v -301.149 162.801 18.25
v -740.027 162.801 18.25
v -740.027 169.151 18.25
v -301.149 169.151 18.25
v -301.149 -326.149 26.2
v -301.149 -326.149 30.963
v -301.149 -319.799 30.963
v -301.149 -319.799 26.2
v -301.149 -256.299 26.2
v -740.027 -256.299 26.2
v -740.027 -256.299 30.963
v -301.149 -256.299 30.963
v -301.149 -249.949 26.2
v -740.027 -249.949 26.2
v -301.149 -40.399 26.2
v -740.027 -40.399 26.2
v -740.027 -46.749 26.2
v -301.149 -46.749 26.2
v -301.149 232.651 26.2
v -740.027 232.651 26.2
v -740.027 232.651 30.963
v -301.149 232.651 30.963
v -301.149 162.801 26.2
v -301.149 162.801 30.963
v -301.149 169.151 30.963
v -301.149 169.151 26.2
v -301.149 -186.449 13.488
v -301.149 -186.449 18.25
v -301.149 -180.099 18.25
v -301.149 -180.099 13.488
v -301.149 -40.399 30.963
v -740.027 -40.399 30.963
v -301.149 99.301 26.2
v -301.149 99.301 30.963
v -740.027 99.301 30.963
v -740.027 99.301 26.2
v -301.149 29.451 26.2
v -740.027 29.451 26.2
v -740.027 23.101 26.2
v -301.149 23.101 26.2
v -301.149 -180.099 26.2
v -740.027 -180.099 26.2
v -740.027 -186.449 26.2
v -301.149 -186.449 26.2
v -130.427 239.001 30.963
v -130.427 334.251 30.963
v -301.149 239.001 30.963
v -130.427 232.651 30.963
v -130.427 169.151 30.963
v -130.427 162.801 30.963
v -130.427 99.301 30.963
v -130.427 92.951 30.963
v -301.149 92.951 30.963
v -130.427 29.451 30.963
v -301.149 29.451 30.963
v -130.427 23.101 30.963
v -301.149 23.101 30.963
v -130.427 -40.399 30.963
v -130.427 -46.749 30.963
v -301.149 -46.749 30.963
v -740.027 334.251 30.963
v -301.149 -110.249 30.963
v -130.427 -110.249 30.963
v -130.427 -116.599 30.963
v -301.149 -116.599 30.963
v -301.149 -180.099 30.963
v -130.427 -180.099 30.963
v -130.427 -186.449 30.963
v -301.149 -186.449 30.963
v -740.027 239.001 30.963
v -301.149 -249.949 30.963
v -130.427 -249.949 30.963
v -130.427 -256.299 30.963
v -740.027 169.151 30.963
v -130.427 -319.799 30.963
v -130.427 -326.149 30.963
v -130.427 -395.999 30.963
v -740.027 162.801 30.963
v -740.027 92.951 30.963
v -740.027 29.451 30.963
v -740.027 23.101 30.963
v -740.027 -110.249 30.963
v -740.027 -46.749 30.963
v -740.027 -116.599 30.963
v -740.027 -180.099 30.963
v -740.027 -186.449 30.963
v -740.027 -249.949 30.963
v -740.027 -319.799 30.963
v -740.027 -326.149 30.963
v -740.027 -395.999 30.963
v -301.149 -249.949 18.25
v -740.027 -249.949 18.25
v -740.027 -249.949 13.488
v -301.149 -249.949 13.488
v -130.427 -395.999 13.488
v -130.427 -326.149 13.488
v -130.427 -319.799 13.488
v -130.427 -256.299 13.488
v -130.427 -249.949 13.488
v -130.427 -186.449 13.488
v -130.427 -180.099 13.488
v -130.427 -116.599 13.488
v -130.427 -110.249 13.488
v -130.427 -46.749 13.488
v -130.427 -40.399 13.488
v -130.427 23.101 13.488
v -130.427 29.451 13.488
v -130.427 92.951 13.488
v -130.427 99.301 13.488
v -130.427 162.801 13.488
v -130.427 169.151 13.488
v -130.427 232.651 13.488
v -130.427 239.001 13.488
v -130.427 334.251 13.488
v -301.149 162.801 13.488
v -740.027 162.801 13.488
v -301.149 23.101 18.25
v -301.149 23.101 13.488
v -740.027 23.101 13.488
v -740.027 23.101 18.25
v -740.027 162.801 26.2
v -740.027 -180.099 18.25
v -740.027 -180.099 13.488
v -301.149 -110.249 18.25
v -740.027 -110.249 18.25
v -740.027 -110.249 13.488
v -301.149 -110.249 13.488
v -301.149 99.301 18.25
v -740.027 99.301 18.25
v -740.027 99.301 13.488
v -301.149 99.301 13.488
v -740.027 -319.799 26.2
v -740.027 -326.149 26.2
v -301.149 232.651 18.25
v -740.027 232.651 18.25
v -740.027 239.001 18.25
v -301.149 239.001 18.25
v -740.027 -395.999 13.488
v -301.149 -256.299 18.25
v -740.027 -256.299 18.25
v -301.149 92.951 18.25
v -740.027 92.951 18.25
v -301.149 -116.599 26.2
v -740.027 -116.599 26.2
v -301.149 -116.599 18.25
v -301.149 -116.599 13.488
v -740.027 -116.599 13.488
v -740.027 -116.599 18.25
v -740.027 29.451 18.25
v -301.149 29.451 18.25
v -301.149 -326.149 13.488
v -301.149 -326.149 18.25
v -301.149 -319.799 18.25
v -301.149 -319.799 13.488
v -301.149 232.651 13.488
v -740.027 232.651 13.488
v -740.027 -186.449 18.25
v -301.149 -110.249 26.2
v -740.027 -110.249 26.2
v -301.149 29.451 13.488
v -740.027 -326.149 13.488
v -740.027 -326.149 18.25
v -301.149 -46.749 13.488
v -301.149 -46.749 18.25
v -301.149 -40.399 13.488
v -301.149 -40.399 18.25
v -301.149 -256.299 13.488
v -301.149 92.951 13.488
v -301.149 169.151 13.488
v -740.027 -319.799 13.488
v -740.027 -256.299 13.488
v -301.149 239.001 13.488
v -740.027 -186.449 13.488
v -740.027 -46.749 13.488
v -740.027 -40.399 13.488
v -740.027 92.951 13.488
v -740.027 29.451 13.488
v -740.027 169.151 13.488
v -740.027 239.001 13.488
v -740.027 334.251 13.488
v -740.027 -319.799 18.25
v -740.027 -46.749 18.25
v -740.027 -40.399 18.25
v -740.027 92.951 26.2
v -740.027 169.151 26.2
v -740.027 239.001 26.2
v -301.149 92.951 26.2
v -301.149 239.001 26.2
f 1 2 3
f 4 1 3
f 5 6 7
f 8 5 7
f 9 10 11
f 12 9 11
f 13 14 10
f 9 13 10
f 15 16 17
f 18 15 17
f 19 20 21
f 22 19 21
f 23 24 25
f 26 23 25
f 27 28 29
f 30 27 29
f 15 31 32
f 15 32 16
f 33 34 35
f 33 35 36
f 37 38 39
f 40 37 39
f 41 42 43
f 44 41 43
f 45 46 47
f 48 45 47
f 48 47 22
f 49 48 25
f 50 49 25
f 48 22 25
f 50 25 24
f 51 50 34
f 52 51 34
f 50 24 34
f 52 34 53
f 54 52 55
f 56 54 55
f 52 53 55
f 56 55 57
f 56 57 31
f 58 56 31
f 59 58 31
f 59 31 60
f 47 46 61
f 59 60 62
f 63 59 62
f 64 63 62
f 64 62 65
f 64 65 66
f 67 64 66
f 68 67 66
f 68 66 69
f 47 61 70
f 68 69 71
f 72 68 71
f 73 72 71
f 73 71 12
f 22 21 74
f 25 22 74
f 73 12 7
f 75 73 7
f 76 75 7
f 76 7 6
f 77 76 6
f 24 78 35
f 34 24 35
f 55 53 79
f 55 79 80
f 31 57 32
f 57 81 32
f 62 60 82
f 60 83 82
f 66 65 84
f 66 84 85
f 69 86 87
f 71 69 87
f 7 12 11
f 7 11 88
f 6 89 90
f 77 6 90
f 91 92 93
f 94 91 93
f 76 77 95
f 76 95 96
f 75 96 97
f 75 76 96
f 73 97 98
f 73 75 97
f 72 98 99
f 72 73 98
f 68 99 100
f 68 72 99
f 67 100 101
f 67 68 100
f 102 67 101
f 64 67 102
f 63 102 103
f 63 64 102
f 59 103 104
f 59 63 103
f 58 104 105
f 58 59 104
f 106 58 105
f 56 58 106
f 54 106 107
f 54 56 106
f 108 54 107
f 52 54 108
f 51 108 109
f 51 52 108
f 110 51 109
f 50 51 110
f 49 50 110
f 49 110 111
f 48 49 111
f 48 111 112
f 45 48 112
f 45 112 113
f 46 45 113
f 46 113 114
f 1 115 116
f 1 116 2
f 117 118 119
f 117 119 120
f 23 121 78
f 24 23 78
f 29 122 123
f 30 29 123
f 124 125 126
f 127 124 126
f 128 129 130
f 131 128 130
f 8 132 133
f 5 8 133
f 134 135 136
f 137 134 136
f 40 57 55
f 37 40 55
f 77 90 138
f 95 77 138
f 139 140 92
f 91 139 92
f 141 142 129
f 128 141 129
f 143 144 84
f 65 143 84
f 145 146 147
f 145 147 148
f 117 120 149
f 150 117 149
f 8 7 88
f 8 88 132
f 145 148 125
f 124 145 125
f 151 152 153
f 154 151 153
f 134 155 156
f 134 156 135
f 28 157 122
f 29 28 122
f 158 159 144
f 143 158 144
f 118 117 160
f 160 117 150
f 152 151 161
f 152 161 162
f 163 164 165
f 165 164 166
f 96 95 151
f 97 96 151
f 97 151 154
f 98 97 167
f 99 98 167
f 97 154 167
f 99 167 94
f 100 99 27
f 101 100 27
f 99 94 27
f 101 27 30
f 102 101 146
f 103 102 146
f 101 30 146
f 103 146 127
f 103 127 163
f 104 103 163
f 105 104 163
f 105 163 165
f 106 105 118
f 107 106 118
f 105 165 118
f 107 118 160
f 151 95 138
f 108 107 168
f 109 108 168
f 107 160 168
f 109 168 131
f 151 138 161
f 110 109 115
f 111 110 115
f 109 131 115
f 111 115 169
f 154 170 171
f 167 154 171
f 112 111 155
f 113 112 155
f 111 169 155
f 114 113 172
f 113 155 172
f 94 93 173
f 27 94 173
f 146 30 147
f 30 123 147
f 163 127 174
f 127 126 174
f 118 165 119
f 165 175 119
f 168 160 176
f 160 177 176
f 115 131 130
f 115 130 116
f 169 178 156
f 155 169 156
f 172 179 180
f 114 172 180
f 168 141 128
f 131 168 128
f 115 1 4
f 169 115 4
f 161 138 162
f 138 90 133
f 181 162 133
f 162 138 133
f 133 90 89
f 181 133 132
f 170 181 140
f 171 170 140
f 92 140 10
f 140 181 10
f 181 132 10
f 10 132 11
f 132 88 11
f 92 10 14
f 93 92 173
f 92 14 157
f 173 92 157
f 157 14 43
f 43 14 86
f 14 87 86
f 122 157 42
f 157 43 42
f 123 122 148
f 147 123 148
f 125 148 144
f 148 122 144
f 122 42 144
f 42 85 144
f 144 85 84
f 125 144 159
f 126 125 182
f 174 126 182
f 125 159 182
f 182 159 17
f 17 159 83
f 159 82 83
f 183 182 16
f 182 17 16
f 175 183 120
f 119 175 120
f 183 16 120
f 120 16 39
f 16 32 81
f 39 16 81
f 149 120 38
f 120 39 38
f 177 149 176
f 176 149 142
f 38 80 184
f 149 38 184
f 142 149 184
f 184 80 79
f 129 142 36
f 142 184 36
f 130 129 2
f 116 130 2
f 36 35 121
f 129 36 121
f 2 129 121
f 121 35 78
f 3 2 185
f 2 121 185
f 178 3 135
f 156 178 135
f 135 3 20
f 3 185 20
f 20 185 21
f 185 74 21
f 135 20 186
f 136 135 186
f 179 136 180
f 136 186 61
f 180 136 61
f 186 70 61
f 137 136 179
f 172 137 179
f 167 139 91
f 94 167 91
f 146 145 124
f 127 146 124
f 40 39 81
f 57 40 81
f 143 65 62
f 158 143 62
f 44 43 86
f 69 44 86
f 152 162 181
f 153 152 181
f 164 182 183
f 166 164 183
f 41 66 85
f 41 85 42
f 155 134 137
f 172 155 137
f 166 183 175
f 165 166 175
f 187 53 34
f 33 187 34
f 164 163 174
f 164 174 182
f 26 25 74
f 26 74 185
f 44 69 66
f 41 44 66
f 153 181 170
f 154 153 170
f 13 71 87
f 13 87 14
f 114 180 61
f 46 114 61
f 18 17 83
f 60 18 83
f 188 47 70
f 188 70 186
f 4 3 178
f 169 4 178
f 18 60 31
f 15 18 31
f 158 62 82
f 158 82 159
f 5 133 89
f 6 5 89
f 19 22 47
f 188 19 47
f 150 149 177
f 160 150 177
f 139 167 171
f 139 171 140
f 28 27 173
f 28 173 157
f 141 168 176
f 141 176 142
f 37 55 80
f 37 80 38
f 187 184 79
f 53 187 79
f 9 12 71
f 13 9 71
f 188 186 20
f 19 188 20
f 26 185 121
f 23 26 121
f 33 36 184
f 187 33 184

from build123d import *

# Parameters (mm, degrees)
PARTSCAB_REFERENCE_START = -740.027426398
PARTSCAB_REFERENCE_DEPTH = 1475.316666666
SKETCH1_W                = 865.716666666
SKETCH1_H                = 730.25
CUT_EXTRUDE1_DEPTH       = 840.500444405
BOSS_EXTRUDE1_REACH      = 841.5
SKETCH2_W                = 170.721463347
SKETCH2_H                = 730.25


# Read off the part's stored shape, not the designer's step: PartsCab_Reference
with BuildPart() as part:
    # PartsCab_Reference outline → PartsCab_Reference (new body)
    with BuildSketch(Plane.YZ.offset(PARTSCAB_REFERENCE_START)):
        Polygon((-395.998764796, 30.962918268), (-395.998764796, 13.487718268), (-326.148764796, 13.487718268), (-326.148764796, 18.250218268), (-319.798764796, 18.250218268), (-319.798764796, 13.487718268), (-256.298764796, 13.487718268), (-256.298764796, 18.250218268), (-249.948764796, 18.250218268), (-249.948764796, 13.487718268), (-186.448764796, 13.487718268), (-186.448764796, 18.250218268), (-180.098764796, 18.250218268), (-180.098764796, 13.487718268), (-116.598764796, 13.487718268), (-116.598764796, 18.250218268), (-110.248764796, 18.250218268), (-110.248764796, 13.487718268), (-46.748764796, 13.487718268), (-46.748764796, 18.250218268), (-40.398764796, 18.250218268), (-40.398764796, 13.487718268), (23.101235204, 13.487718268), (23.101235204, 18.250218268), (29.451235204, 18.250218268), (29.451235204, 13.487718268), (92.951235204, 13.487718268), (92.951235204, 18.250218268), (99.301235204, 18.250218268), (99.301235204, 13.487718268), (162.801235204, 13.487718268), (162.801235204, 18.250218268), (169.151235204, 18.250218268), (169.151235204, 13.487718268), (232.651235204, 13.487718268), (232.651235204, 18.250218268), (239.001235204, 18.250218268), (239.001235204, 13.487718268), (334.251235204, 13.487718268), (334.251235204, 30.962918268), (239.001235204, 30.962918268), (239.001235204, 26.200418268), (232.651235204, 26.200418268), (232.651235204, 30.962918268), (169.151235204, 30.962918268), (169.151235204, 26.200418268), (162.801235204, 26.200418268), (162.801235204, 30.962918268), (99.301235204, 30.962918268), (99.301235204, 26.200418268), (92.951235204, 26.200418268), (92.951235204, 30.962918268), (29.451235204, 30.962918268), (29.451235204, 26.200418268), (23.101235204, 26.200418268), (23.101235204, 30.962918268), (-40.398764796, 30.962918268), (-40.398764796, 26.200418268), (-46.748764796, 26.200418268), (-46.748764796, 30.962918268), (-110.248764796, 30.962918268), (-110.248764796, 26.200418268), (-116.598764796, 26.200418268), (-116.598764796, 30.962918268), (-180.098764796, 30.962918268), (-180.098764796, 26.200418268), (-186.448764796, 26.200418268), (-186.448764796, 30.962918268), (-249.948764796, 30.962918268), (-249.948764796, 26.200418268), (-256.298764796, 26.200418268), (-256.298764796, 30.962918268), (-319.798764796, 30.962918268), (-319.798764796, 26.200418268), (-326.148764796, 26.200418268), (-326.148764796, 30.962918268), align=None)
    extrude(amount=PARTSCAB_REFERENCE_DEPTH)

    # Sketch1 → Cut-Extrude1 (cut, through all)
    with BuildSketch(Plane.XY.offset(30.962918268)):
        with Locations((302.430906935, -30.873764796)):
            Rectangle(SKETCH1_W, SKETCH1_H)
    extrude(amount=-CUT_EXTRUDE1_DEPTH, mode=Mode.SUBTRACT)

    # Boss-Extrude1: up to this face of the body (flat: up to its plane)
    boss_extrude1_end = Plane(part.part.faces().sort_by_distance((-435.227426398, -361.073764796, 13.487718268))[0])
    # Sketch2 → Boss-Extrude1 (add, up to the picked face)
    with BuildSketch(Plane.XY.offset(30.962918268), mode=Mode.PRIVATE) as boss_extrude1_sk1:
        with Locations((-215.788158071, -30.873764796)):
            Rectangle(SKETCH2_W, SKETCH2_H)
    boss_extrude1_tool1 = split(extrude(boss_extrude1_sk1.sketch, amount=-BOSS_EXTRUDE1_REACH, mode=Mode.PRIVATE), bisect_by=boss_extrude1_end, keep=Keep.BOTH, mode=Mode.PRIVATE)
    add(boss_extrude1_tool1.solids().sort_by(Axis((-215.788158, -30.873765, 30.962918), (0, 0, -1)))[0])


solid = part.part
